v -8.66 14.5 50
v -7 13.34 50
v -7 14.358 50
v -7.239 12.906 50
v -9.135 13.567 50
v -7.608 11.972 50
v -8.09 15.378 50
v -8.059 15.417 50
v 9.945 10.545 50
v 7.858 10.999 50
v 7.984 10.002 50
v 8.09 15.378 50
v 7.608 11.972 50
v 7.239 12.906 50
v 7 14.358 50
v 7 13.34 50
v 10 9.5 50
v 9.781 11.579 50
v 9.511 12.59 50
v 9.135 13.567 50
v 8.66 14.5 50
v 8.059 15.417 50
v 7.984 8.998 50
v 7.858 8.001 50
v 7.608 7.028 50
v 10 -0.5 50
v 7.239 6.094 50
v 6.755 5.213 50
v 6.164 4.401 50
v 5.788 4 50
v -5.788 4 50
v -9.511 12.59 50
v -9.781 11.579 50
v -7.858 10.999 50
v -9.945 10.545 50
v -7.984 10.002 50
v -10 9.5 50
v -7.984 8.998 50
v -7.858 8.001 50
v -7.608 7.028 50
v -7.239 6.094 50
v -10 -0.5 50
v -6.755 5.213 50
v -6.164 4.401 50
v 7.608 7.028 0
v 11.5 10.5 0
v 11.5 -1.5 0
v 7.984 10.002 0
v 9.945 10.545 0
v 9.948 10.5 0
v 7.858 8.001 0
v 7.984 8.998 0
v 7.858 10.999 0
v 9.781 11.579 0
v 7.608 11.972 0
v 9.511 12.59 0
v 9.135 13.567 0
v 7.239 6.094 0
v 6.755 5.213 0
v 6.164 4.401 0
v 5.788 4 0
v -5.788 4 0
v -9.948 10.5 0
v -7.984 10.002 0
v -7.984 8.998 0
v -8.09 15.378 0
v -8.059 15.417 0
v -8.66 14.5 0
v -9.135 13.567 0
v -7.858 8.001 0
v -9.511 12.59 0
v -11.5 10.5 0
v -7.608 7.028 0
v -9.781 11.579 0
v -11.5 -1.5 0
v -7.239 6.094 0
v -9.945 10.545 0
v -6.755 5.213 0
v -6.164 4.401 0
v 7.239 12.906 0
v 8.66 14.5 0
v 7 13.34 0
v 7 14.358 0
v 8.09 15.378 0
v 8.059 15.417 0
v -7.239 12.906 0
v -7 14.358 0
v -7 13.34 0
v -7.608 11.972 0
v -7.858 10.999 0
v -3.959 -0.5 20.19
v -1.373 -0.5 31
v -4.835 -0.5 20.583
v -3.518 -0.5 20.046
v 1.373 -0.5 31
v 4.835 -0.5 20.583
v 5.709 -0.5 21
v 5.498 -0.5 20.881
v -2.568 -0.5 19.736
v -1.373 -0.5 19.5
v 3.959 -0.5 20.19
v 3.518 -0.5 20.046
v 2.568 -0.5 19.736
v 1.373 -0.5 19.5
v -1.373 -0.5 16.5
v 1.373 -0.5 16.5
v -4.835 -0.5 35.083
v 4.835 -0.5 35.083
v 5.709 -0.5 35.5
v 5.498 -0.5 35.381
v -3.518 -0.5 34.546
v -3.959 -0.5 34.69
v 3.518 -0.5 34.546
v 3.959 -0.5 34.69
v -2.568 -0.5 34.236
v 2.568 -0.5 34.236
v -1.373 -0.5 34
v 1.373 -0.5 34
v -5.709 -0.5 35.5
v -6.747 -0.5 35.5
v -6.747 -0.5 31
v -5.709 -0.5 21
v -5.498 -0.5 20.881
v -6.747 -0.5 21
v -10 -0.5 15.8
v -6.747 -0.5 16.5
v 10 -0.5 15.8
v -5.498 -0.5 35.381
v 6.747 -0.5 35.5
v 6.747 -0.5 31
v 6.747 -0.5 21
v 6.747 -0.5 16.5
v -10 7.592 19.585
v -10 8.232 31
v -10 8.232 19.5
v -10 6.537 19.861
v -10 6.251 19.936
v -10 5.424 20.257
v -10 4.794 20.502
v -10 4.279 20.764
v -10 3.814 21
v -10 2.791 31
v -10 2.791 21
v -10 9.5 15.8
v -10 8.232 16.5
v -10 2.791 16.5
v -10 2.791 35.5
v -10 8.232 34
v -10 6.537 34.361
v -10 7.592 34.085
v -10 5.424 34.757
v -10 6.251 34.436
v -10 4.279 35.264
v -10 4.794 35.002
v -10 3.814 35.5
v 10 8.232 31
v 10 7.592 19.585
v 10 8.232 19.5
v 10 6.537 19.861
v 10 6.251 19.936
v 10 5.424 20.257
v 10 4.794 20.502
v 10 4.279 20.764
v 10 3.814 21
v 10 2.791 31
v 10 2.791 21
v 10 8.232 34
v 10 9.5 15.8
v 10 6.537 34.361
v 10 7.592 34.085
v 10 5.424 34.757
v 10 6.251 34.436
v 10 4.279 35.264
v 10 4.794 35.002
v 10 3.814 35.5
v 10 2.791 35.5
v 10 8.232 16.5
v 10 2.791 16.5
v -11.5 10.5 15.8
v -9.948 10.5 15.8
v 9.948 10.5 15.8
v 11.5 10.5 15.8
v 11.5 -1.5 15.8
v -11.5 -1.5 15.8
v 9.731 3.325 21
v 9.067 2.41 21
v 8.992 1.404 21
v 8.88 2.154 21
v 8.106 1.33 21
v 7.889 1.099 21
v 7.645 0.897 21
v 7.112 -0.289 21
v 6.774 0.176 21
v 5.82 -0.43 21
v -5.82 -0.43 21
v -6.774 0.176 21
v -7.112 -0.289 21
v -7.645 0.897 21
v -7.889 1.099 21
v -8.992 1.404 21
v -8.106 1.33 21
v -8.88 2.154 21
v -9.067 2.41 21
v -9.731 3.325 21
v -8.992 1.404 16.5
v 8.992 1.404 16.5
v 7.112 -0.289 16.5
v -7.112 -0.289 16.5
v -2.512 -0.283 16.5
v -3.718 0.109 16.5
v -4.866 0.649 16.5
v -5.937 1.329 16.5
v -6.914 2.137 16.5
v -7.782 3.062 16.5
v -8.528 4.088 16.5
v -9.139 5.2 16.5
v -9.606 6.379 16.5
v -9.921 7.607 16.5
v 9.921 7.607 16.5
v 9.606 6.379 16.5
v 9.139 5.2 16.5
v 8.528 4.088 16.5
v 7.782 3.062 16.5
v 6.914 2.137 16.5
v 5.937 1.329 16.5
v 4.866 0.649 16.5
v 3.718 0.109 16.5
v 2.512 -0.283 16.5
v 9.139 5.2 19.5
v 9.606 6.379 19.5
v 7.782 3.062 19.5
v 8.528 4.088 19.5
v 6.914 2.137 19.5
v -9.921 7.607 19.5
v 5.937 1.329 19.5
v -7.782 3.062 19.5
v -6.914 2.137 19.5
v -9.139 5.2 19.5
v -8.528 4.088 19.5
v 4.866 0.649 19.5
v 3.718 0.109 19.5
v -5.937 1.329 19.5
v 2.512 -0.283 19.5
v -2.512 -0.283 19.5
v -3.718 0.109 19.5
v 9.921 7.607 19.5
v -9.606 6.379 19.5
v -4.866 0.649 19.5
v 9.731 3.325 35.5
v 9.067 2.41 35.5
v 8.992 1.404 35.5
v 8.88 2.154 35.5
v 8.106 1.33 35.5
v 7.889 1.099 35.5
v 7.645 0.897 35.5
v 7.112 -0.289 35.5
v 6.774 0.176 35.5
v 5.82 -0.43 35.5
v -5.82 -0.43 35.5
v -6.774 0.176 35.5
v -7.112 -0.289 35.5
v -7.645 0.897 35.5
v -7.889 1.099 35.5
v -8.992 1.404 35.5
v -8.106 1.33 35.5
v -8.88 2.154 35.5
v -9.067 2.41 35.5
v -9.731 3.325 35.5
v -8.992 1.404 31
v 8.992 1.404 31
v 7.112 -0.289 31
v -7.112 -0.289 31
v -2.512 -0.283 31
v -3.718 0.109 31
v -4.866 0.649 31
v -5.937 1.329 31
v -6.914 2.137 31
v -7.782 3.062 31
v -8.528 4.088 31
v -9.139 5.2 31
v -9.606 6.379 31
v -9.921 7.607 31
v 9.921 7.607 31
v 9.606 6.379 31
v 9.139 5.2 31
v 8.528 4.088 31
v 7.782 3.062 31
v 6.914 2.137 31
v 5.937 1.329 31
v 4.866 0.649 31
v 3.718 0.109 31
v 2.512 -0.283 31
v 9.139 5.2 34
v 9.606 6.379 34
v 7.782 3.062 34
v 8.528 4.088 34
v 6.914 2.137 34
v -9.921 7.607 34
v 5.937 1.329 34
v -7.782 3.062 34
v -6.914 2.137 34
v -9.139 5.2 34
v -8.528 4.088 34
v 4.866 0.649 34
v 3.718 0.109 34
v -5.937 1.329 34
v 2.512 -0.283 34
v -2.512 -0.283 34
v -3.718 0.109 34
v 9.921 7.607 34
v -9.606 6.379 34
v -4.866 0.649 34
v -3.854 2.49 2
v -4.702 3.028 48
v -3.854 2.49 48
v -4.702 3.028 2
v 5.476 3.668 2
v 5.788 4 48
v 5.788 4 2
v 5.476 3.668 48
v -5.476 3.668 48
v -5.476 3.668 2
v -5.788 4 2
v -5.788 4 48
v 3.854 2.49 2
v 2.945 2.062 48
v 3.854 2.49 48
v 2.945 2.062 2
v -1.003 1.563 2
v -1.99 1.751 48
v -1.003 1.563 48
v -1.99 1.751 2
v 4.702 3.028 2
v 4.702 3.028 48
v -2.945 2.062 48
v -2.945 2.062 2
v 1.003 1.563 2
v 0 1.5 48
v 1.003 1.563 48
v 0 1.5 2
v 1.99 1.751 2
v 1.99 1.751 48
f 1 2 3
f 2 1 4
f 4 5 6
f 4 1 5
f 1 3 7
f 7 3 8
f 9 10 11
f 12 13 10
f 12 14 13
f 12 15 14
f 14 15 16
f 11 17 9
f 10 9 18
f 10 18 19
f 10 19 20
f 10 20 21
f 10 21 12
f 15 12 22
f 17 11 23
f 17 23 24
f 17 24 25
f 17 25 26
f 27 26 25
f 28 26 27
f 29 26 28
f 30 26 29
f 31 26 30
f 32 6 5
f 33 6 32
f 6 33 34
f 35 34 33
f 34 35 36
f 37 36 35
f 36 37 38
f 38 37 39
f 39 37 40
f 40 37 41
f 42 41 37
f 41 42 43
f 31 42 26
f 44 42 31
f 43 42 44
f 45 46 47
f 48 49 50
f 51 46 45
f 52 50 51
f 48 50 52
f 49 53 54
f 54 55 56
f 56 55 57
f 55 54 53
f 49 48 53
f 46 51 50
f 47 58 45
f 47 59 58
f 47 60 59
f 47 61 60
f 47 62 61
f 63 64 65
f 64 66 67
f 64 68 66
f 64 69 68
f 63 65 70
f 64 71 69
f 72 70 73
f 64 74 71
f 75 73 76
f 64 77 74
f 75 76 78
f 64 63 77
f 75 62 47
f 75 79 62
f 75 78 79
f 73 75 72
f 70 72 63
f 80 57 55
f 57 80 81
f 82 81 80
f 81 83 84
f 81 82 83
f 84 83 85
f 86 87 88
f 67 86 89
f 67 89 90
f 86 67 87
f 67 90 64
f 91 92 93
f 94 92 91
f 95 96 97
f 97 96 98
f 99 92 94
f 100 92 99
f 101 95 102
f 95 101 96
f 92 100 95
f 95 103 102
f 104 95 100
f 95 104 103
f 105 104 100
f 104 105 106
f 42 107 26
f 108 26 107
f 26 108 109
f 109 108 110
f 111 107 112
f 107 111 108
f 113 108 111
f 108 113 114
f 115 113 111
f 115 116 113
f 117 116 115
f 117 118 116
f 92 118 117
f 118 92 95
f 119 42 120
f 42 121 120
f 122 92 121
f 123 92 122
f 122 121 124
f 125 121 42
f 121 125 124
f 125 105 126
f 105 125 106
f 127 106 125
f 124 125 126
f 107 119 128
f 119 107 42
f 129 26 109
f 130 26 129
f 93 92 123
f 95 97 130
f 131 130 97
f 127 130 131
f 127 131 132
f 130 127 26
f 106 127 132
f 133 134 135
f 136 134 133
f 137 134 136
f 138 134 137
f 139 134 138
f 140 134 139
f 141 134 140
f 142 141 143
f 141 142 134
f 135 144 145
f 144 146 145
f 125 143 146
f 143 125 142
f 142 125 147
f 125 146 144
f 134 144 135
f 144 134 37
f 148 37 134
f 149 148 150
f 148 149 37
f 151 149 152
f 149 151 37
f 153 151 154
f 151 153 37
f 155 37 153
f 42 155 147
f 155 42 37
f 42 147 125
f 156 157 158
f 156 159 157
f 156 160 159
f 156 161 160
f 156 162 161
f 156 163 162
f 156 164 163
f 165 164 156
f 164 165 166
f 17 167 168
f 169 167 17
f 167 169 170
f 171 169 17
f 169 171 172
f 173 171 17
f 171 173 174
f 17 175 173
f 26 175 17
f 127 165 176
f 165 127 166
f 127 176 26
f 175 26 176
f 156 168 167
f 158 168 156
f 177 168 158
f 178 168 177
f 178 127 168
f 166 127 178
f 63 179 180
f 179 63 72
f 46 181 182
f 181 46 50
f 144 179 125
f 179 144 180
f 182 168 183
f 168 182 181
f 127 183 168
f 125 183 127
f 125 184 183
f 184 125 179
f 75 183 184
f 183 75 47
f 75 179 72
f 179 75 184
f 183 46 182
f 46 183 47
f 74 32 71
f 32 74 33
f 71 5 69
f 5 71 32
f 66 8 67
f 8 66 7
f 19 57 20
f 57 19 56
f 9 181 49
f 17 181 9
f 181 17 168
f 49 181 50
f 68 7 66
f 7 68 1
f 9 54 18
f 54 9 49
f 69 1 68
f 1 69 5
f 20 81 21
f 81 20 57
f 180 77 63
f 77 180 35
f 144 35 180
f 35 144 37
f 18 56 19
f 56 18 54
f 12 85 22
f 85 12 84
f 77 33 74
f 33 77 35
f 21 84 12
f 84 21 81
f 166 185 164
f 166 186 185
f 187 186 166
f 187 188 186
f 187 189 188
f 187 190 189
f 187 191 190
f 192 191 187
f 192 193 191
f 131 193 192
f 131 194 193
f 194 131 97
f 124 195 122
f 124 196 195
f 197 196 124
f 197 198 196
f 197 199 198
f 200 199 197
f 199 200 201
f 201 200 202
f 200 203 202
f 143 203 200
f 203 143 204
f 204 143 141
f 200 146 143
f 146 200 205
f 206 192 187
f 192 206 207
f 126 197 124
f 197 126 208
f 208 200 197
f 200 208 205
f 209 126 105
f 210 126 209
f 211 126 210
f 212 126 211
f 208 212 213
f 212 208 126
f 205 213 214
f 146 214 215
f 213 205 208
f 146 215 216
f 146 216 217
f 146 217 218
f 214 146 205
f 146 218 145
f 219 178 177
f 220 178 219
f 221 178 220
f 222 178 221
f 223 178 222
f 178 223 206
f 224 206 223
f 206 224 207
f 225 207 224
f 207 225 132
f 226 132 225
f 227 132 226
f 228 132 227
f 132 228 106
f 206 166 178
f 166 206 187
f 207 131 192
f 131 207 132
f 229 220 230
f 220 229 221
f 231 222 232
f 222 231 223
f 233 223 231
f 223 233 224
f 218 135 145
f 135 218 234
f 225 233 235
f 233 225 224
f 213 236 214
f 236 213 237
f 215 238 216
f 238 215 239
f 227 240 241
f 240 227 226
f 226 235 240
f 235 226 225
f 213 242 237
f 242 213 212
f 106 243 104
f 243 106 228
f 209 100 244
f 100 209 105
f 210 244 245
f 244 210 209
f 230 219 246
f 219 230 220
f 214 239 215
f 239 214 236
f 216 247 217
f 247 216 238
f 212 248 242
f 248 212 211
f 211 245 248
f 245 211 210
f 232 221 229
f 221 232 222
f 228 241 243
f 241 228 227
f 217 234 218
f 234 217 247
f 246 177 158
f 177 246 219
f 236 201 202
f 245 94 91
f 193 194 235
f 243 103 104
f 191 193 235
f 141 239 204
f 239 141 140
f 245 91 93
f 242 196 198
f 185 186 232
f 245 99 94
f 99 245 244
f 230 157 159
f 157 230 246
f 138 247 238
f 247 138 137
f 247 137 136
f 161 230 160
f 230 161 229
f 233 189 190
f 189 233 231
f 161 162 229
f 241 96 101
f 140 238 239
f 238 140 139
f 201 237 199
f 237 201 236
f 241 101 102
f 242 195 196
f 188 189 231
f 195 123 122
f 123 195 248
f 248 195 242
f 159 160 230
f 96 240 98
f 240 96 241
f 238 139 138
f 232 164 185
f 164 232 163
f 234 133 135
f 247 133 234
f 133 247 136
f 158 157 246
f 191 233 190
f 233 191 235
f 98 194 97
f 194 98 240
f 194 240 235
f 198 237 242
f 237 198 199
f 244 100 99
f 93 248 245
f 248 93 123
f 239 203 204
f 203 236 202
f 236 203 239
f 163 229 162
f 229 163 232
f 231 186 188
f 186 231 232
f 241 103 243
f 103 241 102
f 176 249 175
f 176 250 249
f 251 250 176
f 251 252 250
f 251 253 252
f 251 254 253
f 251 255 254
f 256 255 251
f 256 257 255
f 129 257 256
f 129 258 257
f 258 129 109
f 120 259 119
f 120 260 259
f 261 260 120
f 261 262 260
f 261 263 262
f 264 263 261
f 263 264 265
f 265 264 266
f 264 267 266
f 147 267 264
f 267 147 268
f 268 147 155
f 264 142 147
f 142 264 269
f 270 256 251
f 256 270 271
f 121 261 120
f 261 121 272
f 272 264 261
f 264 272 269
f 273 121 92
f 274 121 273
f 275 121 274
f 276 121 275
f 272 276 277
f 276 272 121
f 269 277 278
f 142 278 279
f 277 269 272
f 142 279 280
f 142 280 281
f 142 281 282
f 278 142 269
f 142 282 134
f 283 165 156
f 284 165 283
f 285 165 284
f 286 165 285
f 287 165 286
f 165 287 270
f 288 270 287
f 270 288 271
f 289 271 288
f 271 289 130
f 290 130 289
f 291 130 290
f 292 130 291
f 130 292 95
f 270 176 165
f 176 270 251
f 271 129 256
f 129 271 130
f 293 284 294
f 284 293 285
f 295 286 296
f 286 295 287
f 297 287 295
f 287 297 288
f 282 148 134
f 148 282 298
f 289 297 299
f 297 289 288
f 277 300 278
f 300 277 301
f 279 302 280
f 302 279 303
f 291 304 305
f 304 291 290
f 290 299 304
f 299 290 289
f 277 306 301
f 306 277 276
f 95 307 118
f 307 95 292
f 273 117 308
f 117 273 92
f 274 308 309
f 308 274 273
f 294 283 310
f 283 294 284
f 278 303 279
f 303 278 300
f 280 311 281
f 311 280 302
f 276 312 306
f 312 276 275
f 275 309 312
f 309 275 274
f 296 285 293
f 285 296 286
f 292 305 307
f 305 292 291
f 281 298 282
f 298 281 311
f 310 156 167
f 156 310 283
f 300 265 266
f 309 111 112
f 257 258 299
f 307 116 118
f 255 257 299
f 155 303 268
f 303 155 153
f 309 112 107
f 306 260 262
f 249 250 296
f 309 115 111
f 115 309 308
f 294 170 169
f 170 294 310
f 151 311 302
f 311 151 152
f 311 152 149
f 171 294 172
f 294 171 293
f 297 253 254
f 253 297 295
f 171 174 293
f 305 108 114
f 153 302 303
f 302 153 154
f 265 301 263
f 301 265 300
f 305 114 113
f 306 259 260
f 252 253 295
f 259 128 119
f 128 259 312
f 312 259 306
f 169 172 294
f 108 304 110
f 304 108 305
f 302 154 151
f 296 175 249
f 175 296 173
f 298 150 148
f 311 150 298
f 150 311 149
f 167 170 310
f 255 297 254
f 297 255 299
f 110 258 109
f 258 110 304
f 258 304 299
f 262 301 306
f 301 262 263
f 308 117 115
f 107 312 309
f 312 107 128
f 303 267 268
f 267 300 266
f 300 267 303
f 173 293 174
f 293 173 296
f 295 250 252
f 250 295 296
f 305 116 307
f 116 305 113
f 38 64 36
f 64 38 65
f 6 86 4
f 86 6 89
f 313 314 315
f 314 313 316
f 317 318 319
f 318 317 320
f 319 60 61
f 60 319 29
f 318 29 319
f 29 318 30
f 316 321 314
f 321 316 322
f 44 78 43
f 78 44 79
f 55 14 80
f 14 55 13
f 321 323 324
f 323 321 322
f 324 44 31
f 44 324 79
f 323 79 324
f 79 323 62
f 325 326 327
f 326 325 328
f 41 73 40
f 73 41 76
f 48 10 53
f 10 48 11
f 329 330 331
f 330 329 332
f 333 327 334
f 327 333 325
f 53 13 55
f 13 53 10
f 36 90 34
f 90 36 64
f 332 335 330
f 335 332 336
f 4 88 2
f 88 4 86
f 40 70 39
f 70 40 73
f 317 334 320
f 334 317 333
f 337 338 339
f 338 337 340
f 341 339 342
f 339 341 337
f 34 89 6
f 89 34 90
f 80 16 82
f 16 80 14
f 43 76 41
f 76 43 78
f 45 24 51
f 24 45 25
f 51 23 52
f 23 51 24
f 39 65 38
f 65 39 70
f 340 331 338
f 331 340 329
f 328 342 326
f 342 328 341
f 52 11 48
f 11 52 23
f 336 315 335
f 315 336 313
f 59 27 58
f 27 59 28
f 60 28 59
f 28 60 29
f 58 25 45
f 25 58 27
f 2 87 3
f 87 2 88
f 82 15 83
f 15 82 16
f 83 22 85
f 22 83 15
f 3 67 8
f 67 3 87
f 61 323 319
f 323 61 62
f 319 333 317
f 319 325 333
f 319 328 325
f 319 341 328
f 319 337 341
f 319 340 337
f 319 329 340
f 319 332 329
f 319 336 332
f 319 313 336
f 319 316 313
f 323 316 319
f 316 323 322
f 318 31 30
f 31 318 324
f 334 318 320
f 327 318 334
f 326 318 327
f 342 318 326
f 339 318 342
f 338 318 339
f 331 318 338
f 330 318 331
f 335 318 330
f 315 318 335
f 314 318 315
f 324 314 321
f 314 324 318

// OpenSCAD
// file: functions.scad
// PRUSA Mendel  
// Functions used in many files
// GNU GPL v2
// Josef Průša
// josefprusa@me.com
// prusadjs.cz
// http://www.reprap.org/wiki/Prusa_Mendel
// http://github.com/prusajr/PrusaMendel

module nut(d,h,horizontal=true){
cornerdiameter =  (d / 2) / cos (180 / 6);
cylinder(h = h, r = cornerdiameter, $fn = 6);
if(horizontal){
for(i = [1:6]){
	rotate([0,0,60*i]) translate([-cornerdiameter-0.2,0,0]) rotate([0,0,-45]) cube(size = [2,2,h]);
}}
}

// By nophead
module polyhole(d,h) {
    n = max(round(2 * d),3);
    rotate([0,0,180])
        cylinder(h = h, r = (d / 2) / cos (180 / n), $fn = n);
}




module roundcorner(diameter){
	difference(){
		cube(size = [diameter,diameter,99], center = false);
		translate(v = [diameter, diameter, 0]) cylinder(h = 100, r=diameter, center=true);
	}
}
// file: metric.scad
// PRUSA Mendel  
// Default metric sizes
// GNU GPL v2
// Josef Průša
// josefprusa@me.com
// prusadjs.cz
// http://www.reprap.org/wiki/Prusa_Mendel
// http://github.com/prusajr/PrusaMendel

// DONT CHANGE THIS FILE! ALTER VALUES IN CONFIGURATION.SCAD INSTEAD

// RODS

threaded_rod_diameter = 8.2;
threaded_rod_diameter_horizontal = 8.2;
smooth_bar_diameter = 8;
smooth_bar_diameter_horizontal = 8.5;

// Nuts and bolts

m8_diameter = 8.9;
m8_nut_diameter = 15.25;

m4_diameter = 4.5;
m4_nut_diameter = 9;

m3_diameter = 3.6;
m3_nut_diameter = 6.25;
m3_nut_heigth = 2.3;
m3_nut_wallDist = cos(30)*m3_nut_diameter;
m3_nut_diameter_horizontal = 6.1;

// Bushing holder

bushing_core_diameter = smooth_bar_diameter;
bushing_material_thickness = 1;

// Motors

motor_shaft = 5.5;
// file: configuration.scad
// PRUSA Mendel  
// Configuration file
// GNU GPL v2
// Josef Průša
// josefprusa@me.com
// prusadjs.cz
// http://www.reprap.org/wiki/Prusa_Mendel
// http://github.com/prusajr/PrusaMendel

// PLEASE SELECT ONE OF THE CONFIGURATIONS BELOW
// BY UN-COMMENTING IT

// Uncomment for metric settings
// METRIC METRIC METRIC METRIC METRIC METRIC METRIC METRIC 

include <metric.scad>;

// Uncomment for imperial settings
// IMPERIAL IMPERIAL IMPERIAL IMPERIAL IMPERIAL IMPERIAL IMPERIAL 

//include <sae.scad>;

// CUSTOM CUSTOM CUSTOM CUSTOM CUSTOM CUSTOM CUSTOM CUSTOM CUSTOM

thin_wall = 3;

// LM8UU
linear = false;


// CHANGE ONLY THE STUFF YOU KNOW
// IT WILL REPLACE DEFAULT SETTING

// RODS

// threaded_rod_diameter = 0;
// threaded_rod_diameter_horizontal = 0;
// smooth_bar_díameter = 0;
// smooth_bar_díameter_horizontal = 0;

// Nuts and bolts

// m8_diameter = 0;
// m8_nut_diameter = 0;

// m4_diameter = 0;
// m4_nut_diameter = 0;

// m3_diameter = 0;
// m3_nut_diameter = 0;

// Bushing holder

// bushing_core_diameter = smooth_bar_díameter;
// bushing_material_thickness = 0;


///counted stuff
m3_nut_diameter_bigger = ((m3_nut_diameter  / 2) / cos (180 / 6))*2;

// functions 
include <functions.scad>
// main file
// PRUSA Mendel  
// Bushings
// GNU GPL v2
// Josef Průša
// josefprusa@me.com
// prusadjs.cz
// http://www.reprap.org/wiki/Prusa_Mendel
// http://github.com/prusajr/PrusaMendel

include <configuration.scad>

/**
 * @id bushing
 * @name Bushing
 * @category Printed
 * @id bushing
 */ 

z_linear_bearings(luu_version=true);

luu_height=45;
uu_height=24;

module z_linear_bearings(luu=false,override_height=-1)
{
translate(v=[0,9.5,0]) rotate(a=[0,0,90])
assign (height=(override_height>0)?override_height:luu_version?luu_height+4+1:65)
{
	
	difference()
	{
		union()
		{
			//main block
			translate([-5,0,height/2]) cube([10,20,height],center=true);
			//holder for main block in x-end
			translate([-5,0,15.8/2]) cube([12,23,15.8],center=true);
			translate([0,0,0]) cylinder(h=height,r=10,$fn=60);
		}
		//main axis
		translate([0,0,-2]) cylinder(h=height+5, r=8, $fn=50);
		//main cut
		translate([10,0,height/2]) cube([20,14,height+5],center=true);
		//smooth entry cut
		translate([12,0,height/2]) rotate([0,0,45]) cube([20,20,height+5],center=true);
		translate([0,0,14.5+2]) ziptie();
		translate([0,0,height-(12+2)-5]) ziptie();
	}
	if (luu_version)
	{
	translate([-(10-5.5)/2-5.5,0,0+1]) cube([10-5.5,20,2], center = true);
	translate([-(10-5.5)/2-5.5,0,luu_height+1+2+1]) cube([10-5.5,20,2], center = true);
	}
	else
	{
	translate([-(10-5.5)/2-5.5,0,0+1]) cube([10-5.5,20,2], center = true);
	translate([-(10-5.5)/2-5.5,0,uu_height+1+2+1]) cube([10-5.5,20,2], center = true);
	
	translate([-(10-5.5)/2-5.5,0,65-1]) cube([10-5.5,20,2], center = true);
	translate([-(10-5.5)/2-5.5,0,65-uu_height-1-2-1]) cube([10-5.5,20,2], center = true);
	}
}
}

//ziptie();

module ziptie(){
difference(){
translate(v=[0,0,0]) cylinder(h = 4.5, r=12.1);
translate(v=[0,0,-1]) cylinder(h = 5, r=10.1, $fn=50);
translate(v=[0,0,3]) cylinder(h = 2, r1=10.1, r2=12, $fn=50);
}}
